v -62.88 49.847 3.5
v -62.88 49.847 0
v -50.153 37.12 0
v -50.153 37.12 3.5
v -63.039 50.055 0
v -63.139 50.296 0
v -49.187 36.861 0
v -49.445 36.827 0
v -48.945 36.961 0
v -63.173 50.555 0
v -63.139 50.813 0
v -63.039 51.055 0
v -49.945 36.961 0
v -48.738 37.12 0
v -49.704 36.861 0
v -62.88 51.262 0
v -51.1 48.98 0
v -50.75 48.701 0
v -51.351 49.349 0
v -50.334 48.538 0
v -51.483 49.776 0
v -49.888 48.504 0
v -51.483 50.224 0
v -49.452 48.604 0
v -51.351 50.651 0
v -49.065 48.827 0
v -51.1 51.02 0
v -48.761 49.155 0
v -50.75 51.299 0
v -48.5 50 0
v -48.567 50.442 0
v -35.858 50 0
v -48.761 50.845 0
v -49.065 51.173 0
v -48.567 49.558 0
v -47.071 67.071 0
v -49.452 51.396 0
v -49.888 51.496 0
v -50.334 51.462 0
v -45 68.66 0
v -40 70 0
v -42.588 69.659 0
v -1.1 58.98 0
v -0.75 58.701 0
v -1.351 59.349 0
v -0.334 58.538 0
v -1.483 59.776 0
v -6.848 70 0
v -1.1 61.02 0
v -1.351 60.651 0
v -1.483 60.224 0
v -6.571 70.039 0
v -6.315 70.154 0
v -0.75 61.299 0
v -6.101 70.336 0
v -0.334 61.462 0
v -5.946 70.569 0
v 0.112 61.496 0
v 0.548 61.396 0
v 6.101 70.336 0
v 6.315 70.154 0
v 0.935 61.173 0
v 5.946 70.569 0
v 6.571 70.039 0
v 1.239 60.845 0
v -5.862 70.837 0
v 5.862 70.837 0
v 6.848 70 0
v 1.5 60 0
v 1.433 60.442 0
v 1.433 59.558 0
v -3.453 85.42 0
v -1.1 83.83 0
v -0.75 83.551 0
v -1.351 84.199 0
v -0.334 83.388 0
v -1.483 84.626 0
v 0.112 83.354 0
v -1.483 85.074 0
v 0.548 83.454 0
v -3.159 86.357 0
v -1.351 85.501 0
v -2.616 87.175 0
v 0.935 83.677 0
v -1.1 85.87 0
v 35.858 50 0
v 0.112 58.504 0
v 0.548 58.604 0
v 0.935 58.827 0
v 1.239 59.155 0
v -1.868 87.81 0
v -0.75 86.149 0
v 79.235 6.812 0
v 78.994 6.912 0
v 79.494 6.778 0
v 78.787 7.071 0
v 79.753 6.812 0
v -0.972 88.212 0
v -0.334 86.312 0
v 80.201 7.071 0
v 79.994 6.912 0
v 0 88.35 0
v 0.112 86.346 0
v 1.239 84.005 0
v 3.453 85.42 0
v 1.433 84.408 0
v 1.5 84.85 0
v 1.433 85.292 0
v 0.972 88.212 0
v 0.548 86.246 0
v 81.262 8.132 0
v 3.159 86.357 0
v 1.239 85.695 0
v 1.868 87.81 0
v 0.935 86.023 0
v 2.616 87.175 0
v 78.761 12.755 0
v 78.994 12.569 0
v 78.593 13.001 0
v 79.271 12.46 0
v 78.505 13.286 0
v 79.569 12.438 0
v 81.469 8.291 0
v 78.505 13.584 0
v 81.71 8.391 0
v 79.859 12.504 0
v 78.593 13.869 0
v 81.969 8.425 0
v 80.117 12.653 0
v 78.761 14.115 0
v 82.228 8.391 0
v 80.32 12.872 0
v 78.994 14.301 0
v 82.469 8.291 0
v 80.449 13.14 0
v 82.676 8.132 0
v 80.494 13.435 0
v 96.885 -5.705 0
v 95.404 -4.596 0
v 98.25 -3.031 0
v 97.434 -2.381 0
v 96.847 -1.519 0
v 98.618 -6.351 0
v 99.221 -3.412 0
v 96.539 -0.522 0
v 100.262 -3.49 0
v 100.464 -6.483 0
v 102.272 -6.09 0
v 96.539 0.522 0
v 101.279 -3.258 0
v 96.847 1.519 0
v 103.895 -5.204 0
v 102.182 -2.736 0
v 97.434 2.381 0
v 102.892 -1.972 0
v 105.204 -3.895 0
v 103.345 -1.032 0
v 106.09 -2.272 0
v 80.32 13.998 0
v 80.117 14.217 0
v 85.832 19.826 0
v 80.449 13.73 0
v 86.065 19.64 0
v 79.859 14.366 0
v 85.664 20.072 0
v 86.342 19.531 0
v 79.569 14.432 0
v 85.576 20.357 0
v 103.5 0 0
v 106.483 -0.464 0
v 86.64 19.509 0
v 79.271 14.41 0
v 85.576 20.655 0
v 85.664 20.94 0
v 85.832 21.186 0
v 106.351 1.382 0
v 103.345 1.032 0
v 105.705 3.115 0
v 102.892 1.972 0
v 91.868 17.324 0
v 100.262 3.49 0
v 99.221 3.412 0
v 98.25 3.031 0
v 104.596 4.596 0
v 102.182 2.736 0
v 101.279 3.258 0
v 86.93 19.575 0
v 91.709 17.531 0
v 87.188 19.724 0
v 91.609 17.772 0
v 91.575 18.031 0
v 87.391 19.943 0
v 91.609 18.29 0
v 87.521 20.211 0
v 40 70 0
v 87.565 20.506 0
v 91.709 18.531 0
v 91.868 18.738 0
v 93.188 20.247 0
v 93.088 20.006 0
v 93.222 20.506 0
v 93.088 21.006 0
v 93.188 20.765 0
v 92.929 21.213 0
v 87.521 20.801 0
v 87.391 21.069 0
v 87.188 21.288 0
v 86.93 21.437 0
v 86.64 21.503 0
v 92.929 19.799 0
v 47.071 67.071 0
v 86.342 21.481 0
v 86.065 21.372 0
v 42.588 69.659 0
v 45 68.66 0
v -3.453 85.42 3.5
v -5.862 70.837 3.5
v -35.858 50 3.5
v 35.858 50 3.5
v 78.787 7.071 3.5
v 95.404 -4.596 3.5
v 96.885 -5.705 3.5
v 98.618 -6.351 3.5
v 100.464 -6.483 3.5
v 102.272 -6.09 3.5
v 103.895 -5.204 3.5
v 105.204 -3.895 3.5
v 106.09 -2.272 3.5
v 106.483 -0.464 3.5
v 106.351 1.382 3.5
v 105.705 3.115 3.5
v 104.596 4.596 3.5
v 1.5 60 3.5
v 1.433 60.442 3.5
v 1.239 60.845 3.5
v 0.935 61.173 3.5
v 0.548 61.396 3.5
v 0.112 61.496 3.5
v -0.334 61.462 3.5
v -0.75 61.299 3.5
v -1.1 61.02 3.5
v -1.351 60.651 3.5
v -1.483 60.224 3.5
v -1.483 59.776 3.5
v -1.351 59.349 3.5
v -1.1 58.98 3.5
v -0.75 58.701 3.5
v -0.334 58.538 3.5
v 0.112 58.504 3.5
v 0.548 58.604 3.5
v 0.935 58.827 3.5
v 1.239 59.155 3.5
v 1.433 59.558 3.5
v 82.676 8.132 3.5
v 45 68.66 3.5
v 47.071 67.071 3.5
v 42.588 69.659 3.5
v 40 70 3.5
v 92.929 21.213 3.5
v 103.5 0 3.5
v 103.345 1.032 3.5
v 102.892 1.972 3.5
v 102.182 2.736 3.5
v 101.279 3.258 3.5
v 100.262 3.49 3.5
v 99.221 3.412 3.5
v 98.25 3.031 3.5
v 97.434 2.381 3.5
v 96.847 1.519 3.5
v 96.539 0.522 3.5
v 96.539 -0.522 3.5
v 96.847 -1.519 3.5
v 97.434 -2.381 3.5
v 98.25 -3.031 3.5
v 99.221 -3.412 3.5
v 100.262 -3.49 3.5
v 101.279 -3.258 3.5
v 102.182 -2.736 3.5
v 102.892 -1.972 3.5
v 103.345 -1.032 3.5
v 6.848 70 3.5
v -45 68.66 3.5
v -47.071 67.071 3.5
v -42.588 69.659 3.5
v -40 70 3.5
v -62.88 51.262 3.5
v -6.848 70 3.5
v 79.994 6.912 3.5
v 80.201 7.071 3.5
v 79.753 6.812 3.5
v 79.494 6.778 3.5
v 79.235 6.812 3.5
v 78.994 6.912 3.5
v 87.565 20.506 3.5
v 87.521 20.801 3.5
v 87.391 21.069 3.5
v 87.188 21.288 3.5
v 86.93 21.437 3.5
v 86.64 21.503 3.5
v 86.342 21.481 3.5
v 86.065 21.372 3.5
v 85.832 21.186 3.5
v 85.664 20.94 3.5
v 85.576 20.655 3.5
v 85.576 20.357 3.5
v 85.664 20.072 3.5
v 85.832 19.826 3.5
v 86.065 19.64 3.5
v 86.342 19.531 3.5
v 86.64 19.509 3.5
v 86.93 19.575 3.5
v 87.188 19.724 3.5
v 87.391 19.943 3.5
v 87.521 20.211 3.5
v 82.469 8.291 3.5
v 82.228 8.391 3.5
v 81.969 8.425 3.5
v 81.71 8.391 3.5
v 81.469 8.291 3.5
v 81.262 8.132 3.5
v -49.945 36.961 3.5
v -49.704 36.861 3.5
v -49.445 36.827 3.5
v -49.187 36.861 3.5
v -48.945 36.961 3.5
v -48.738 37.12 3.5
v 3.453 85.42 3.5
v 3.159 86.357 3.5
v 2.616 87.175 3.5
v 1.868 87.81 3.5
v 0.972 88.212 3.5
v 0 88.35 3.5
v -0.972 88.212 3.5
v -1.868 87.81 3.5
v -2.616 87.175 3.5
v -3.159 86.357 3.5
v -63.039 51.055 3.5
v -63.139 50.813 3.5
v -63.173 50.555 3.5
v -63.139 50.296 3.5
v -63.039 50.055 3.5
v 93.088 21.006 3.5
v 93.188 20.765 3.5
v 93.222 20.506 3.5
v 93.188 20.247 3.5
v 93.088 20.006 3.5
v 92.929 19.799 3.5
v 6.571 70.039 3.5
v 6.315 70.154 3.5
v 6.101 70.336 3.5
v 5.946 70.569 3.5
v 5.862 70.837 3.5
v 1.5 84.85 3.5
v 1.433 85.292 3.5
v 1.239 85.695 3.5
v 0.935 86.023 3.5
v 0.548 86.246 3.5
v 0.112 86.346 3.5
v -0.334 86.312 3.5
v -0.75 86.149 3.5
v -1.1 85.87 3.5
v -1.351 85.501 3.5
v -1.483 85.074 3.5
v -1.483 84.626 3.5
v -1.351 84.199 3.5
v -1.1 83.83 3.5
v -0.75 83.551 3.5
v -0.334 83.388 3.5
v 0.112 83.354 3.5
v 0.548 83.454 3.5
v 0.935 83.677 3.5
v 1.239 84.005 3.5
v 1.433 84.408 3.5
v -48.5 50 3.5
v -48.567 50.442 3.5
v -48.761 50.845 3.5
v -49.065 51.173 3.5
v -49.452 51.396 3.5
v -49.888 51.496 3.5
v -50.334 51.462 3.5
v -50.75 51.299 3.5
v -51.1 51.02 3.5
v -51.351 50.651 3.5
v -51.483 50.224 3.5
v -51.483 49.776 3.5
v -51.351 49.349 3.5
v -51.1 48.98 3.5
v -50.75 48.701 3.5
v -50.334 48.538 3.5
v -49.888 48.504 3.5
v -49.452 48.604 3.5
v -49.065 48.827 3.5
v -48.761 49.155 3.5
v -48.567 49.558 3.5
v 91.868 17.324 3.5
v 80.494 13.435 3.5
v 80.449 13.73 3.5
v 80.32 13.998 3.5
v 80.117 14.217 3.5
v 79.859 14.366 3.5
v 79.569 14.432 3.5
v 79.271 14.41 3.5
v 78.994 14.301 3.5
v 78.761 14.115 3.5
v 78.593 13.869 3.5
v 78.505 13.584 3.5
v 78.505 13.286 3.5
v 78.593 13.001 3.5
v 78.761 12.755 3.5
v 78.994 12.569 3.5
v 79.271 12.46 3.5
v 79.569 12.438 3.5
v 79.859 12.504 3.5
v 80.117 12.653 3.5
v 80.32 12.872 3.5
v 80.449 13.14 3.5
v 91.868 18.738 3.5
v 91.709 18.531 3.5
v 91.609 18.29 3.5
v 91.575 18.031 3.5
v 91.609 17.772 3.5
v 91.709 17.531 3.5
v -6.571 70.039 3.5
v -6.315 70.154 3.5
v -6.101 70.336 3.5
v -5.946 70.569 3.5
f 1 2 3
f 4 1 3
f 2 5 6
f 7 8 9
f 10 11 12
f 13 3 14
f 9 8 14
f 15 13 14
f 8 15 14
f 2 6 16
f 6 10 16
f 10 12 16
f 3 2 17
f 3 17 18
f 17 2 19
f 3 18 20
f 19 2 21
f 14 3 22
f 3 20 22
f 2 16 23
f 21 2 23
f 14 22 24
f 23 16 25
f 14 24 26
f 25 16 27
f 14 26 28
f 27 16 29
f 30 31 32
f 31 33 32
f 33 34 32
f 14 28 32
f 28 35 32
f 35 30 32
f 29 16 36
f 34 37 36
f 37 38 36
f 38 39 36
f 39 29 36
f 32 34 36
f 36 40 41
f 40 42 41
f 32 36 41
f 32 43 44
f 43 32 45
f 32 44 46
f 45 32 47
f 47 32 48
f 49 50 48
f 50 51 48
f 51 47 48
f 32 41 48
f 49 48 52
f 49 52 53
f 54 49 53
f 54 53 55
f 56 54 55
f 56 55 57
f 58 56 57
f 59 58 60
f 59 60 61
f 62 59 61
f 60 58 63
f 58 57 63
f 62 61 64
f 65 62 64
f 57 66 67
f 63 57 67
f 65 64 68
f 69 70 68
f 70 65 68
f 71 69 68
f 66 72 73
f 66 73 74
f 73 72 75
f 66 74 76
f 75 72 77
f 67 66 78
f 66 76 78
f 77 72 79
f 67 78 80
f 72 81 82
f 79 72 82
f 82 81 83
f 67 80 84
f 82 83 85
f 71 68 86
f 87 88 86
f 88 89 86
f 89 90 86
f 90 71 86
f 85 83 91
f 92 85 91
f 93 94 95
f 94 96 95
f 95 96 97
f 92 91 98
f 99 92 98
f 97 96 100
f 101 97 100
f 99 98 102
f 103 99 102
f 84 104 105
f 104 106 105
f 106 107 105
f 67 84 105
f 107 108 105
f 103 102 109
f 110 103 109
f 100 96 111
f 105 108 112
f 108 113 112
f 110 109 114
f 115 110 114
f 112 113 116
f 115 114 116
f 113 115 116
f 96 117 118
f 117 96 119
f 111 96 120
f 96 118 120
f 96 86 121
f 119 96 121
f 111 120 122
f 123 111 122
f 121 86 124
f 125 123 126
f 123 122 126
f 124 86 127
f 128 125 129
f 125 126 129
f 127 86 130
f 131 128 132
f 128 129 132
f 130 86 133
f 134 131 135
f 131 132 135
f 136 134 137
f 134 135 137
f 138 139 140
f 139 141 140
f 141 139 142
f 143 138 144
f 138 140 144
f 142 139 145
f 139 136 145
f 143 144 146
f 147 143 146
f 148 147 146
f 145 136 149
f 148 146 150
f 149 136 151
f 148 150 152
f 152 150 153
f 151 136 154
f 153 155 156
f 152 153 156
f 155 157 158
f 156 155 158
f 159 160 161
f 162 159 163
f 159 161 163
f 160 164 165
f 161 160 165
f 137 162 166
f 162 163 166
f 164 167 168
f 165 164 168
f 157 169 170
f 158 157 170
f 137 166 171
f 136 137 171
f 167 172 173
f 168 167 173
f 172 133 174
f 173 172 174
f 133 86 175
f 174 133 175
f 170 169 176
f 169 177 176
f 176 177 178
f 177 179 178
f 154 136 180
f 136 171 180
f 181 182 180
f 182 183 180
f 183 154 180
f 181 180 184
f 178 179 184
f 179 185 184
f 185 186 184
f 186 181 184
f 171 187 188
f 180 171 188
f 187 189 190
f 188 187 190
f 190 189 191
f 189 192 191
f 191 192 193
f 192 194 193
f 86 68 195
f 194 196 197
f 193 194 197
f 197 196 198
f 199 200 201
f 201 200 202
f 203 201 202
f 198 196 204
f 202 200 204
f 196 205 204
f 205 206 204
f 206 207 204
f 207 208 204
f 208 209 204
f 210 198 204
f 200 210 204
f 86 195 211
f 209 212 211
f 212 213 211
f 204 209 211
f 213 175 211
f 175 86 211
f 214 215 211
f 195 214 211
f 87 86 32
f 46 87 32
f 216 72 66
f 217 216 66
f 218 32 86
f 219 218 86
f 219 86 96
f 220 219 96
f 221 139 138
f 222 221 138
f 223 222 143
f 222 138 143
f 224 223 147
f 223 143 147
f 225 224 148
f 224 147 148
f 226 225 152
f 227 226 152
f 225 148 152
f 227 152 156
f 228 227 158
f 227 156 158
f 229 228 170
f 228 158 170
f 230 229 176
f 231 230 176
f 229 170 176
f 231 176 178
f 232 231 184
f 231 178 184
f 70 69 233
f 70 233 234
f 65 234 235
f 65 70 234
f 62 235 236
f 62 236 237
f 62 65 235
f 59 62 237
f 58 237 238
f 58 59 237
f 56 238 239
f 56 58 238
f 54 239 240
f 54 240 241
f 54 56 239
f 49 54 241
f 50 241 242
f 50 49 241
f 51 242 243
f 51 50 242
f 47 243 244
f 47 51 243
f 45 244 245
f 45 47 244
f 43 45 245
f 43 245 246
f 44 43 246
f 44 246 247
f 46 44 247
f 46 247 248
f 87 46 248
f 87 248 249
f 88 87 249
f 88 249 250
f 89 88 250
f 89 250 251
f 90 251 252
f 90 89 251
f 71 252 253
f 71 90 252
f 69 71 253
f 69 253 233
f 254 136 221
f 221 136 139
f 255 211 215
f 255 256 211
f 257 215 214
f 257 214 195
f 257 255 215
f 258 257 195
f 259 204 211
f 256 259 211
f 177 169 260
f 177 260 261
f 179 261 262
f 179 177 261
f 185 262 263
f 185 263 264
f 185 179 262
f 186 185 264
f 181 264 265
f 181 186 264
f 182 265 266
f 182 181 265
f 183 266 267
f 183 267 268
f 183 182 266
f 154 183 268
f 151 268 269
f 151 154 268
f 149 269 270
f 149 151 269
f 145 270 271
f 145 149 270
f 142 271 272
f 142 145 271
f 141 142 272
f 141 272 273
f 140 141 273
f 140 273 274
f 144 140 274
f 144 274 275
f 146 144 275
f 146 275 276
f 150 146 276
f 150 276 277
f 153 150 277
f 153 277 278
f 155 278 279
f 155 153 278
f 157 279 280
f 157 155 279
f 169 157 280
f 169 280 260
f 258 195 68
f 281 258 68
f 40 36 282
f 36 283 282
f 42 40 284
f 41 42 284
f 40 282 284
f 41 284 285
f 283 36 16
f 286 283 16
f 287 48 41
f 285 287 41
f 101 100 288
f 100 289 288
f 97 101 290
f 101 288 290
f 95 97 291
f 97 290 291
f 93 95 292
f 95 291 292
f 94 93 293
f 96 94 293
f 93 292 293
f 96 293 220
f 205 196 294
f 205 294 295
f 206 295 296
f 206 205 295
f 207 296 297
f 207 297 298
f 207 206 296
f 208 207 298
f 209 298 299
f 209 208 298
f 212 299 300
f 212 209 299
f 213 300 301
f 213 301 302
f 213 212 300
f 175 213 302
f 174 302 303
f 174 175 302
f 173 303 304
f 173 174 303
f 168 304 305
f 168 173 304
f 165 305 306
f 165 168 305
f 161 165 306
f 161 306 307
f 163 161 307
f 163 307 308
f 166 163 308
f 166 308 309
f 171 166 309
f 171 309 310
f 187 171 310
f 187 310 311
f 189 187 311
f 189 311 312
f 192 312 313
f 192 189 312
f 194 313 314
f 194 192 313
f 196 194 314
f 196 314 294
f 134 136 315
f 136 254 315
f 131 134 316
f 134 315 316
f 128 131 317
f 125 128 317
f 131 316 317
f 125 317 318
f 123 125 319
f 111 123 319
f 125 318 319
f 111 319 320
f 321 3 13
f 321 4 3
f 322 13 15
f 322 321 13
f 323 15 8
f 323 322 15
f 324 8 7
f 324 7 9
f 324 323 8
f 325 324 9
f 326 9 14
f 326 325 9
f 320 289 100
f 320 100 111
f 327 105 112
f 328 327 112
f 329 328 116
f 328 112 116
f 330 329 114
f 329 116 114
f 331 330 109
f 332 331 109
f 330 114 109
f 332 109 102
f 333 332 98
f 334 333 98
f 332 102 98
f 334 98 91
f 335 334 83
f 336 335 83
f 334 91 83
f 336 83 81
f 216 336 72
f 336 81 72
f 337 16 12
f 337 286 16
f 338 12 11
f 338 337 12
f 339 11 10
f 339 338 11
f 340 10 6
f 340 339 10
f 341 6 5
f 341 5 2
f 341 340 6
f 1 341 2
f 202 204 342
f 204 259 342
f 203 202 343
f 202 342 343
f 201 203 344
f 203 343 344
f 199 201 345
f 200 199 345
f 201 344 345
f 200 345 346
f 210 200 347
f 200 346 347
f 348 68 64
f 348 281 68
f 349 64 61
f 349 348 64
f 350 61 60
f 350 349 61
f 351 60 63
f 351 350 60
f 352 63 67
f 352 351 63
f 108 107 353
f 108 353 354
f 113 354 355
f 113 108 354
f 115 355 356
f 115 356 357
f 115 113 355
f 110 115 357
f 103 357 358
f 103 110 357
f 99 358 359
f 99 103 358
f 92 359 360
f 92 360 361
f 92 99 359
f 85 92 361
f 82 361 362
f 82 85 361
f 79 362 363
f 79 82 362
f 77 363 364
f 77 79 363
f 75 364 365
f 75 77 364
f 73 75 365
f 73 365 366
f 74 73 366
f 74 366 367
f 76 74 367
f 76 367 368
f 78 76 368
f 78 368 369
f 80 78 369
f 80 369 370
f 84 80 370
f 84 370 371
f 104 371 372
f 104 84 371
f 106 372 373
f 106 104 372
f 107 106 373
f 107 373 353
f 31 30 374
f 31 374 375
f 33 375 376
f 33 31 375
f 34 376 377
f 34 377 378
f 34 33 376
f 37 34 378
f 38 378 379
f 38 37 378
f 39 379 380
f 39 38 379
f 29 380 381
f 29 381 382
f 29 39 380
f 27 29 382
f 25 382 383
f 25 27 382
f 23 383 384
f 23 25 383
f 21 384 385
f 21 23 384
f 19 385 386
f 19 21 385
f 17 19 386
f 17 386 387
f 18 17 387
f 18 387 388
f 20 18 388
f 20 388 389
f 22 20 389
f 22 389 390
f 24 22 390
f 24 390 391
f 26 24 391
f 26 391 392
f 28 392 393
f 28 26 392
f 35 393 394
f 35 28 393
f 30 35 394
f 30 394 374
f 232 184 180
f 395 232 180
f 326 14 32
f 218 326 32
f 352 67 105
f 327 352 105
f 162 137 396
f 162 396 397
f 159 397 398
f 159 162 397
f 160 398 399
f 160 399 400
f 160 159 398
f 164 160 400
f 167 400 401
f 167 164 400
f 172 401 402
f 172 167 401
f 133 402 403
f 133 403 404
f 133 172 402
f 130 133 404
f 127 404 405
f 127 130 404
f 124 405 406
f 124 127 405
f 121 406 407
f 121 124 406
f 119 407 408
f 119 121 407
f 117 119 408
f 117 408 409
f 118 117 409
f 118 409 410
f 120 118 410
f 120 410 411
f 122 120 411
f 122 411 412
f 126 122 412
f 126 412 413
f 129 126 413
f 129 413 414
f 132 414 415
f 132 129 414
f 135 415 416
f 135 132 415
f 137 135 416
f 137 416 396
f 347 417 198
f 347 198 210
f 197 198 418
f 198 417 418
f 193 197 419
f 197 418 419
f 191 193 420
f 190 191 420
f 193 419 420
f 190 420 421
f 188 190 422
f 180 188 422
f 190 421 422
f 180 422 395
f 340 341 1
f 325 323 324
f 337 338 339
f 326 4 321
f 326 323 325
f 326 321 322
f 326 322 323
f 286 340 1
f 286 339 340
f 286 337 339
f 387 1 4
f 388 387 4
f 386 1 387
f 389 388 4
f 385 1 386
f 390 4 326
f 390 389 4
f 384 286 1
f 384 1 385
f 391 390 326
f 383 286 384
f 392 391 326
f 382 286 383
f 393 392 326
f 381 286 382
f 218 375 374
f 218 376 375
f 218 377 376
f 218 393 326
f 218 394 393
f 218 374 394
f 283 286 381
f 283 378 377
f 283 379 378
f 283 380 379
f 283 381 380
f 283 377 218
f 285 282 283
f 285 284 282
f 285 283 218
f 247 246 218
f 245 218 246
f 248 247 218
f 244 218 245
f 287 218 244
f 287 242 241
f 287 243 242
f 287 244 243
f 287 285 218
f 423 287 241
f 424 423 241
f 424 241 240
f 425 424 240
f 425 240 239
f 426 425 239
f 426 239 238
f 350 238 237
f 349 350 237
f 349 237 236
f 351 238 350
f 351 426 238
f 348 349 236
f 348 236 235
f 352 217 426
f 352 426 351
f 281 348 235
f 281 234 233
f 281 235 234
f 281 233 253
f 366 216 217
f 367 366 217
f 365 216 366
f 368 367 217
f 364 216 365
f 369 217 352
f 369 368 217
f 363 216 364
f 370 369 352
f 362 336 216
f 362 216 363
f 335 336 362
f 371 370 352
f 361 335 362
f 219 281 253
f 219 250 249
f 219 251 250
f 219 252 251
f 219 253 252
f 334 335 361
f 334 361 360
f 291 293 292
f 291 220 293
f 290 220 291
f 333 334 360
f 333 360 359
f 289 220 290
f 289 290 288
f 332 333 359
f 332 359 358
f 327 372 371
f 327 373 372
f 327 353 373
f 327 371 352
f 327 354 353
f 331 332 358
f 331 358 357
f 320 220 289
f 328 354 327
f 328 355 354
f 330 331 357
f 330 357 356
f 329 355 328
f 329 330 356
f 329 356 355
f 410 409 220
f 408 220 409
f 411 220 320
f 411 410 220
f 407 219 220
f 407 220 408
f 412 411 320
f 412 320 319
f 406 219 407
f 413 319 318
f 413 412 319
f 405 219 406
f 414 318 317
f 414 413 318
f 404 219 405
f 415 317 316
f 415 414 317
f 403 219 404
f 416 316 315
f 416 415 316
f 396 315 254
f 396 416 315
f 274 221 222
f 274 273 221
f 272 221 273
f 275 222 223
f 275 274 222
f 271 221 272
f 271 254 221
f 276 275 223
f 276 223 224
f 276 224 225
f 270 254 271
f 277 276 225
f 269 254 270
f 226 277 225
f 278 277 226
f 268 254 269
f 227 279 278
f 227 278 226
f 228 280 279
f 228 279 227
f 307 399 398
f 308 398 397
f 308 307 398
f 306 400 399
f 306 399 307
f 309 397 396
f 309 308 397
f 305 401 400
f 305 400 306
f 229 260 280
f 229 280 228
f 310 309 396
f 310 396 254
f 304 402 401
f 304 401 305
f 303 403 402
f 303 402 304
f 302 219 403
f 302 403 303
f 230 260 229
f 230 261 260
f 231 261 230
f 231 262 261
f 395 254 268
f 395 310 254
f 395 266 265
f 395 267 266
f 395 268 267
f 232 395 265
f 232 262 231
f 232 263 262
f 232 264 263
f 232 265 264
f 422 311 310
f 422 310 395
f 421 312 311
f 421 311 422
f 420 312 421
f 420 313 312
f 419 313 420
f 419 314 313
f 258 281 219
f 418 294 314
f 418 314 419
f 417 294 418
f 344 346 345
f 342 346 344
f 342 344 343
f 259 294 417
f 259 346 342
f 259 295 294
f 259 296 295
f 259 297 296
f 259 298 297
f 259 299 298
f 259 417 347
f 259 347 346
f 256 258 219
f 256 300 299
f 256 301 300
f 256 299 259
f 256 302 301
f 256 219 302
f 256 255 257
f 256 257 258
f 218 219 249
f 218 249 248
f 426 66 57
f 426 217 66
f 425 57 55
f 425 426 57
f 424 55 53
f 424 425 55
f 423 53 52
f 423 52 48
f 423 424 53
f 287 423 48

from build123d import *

# Parameters (mm, degrees)
SKETCH7_R           = 1.5
SKETCH7_R_2         = 3.5
SKETCH7_R_3         = 1
BOSS_EXTRUDE1_DEPTH = 3.5
FILLET8_R           = 10
FILLET14_R          = 1
FILLET15_R          = 1
FILLET16_R          = 1


with BuildPart() as part:
    # Sketch7 → Boss-Extrude1 (new body)
    with BuildSketch(Plane.XY):
        with BuildLine():
            Line((81.96877708, 8.838834765), (95.403805922, -4.596194078))
            ThreePointArc((95.403805922, -4.596194078), (104.596194078, -4.596194078), (104.596194078, 4.596194078))
            Line((104.596194078, 4.596194078), (91.161165235, 18.03122292))
            Line((91.161165235, 18.03122292), (93.636038969, 20.506096654))
            Line((93.636038969, 20.506096654), (44.142135624, 70))
            Line((44.142135624, 70), (6, 70))
            Line((6, 70), (3.453220204, 85.420324662))
            ThreePointArc((3.453220204, 85.420324662), (0, 88.35), (-3.453220204, 85.420324662))
            Line((-3.453220204, 85.420324662), (-6, 70))
            Line((-6, 70), (-44.142135624, 70))
            Line((-44.142135624, 70), (-63.587572106, 50.554563517))
            Line((-63.587572106, 50.554563517), (-49.445436483, 36.412427894))
            Line((-49.445436483, 36.412427894), (-35.857864376, 50))
            Line((-35.857864376, 50), (35.857864376, 50))
            Line((35.857864376, 50), (79.493903346, 6.363961031))
            Line((79.493903346, 6.363961031), (81.96877708, 8.838834765))
        make_face()
        with Locations((0, 84.85)):
            Circle(SKETCH7_R, mode=Mode.SUBTRACT)
        with Locations((0, 60)):
            Circle(SKETCH7_R, mode=Mode.SUBTRACT)
        with Locations((100, 0)):
            Circle(SKETCH7_R_2, mode=Mode.SUBTRACT)
        with Locations((86.564971157, 20.506096654)):
            Circle(SKETCH7_R_3, mode=Mode.SUBTRACT)
        with Locations((79.493903346, 13.435028843)):
            Circle(SKETCH7_R_3, mode=Mode.SUBTRACT)
        with Locations((-50, 50)):
            Circle(SKETCH7_R, mode=Mode.SUBTRACT)
    extrude(amount=BOSS_EXTRUDE1_DEPTH)

    # Fillet8
    fillet8_edges = [part.edges().sort_by_distance(p)[0] for p in [
        (-44.142135624, 70, 1.75),
        (44.142135624, 70, 1.75),
    ]]
    fillet(fillet8_edges, radius=FILLET8_R)

    # Fillet14
    fillet14_edges = [part.edges().sort_by_distance(p)[0] for p in [
        (93.636038969, 20.506096654, 1.75),
        (91.161165235, 18.03122292, 1.75),
    ]]
    fillet(fillet14_edges, radius=FILLET14_R)

    # Fillet15
    fillet15_edges = [part.edges().sort_by_distance(p)[0] for p in [
        (-49.445436483, 36.412427894, 1.75),
        (-63.587572106, 50.554563517, 1.75),
        (81.96877708, 8.838834765, 1.75),
        (79.493903346, 6.363961031, 1.75),
    ]]
    fillet(fillet15_edges, radius=FILLET15_R)

    # Fillet16
    fillet16_edges = [part.edges().sort_by_distance(p)[0] for p in [
        (-6, 70, 1.75),
        (6, 70, 1.75),
    ]]
    fillet(fillet16_edges, radius=FILLET16_R)


solid = part.part
